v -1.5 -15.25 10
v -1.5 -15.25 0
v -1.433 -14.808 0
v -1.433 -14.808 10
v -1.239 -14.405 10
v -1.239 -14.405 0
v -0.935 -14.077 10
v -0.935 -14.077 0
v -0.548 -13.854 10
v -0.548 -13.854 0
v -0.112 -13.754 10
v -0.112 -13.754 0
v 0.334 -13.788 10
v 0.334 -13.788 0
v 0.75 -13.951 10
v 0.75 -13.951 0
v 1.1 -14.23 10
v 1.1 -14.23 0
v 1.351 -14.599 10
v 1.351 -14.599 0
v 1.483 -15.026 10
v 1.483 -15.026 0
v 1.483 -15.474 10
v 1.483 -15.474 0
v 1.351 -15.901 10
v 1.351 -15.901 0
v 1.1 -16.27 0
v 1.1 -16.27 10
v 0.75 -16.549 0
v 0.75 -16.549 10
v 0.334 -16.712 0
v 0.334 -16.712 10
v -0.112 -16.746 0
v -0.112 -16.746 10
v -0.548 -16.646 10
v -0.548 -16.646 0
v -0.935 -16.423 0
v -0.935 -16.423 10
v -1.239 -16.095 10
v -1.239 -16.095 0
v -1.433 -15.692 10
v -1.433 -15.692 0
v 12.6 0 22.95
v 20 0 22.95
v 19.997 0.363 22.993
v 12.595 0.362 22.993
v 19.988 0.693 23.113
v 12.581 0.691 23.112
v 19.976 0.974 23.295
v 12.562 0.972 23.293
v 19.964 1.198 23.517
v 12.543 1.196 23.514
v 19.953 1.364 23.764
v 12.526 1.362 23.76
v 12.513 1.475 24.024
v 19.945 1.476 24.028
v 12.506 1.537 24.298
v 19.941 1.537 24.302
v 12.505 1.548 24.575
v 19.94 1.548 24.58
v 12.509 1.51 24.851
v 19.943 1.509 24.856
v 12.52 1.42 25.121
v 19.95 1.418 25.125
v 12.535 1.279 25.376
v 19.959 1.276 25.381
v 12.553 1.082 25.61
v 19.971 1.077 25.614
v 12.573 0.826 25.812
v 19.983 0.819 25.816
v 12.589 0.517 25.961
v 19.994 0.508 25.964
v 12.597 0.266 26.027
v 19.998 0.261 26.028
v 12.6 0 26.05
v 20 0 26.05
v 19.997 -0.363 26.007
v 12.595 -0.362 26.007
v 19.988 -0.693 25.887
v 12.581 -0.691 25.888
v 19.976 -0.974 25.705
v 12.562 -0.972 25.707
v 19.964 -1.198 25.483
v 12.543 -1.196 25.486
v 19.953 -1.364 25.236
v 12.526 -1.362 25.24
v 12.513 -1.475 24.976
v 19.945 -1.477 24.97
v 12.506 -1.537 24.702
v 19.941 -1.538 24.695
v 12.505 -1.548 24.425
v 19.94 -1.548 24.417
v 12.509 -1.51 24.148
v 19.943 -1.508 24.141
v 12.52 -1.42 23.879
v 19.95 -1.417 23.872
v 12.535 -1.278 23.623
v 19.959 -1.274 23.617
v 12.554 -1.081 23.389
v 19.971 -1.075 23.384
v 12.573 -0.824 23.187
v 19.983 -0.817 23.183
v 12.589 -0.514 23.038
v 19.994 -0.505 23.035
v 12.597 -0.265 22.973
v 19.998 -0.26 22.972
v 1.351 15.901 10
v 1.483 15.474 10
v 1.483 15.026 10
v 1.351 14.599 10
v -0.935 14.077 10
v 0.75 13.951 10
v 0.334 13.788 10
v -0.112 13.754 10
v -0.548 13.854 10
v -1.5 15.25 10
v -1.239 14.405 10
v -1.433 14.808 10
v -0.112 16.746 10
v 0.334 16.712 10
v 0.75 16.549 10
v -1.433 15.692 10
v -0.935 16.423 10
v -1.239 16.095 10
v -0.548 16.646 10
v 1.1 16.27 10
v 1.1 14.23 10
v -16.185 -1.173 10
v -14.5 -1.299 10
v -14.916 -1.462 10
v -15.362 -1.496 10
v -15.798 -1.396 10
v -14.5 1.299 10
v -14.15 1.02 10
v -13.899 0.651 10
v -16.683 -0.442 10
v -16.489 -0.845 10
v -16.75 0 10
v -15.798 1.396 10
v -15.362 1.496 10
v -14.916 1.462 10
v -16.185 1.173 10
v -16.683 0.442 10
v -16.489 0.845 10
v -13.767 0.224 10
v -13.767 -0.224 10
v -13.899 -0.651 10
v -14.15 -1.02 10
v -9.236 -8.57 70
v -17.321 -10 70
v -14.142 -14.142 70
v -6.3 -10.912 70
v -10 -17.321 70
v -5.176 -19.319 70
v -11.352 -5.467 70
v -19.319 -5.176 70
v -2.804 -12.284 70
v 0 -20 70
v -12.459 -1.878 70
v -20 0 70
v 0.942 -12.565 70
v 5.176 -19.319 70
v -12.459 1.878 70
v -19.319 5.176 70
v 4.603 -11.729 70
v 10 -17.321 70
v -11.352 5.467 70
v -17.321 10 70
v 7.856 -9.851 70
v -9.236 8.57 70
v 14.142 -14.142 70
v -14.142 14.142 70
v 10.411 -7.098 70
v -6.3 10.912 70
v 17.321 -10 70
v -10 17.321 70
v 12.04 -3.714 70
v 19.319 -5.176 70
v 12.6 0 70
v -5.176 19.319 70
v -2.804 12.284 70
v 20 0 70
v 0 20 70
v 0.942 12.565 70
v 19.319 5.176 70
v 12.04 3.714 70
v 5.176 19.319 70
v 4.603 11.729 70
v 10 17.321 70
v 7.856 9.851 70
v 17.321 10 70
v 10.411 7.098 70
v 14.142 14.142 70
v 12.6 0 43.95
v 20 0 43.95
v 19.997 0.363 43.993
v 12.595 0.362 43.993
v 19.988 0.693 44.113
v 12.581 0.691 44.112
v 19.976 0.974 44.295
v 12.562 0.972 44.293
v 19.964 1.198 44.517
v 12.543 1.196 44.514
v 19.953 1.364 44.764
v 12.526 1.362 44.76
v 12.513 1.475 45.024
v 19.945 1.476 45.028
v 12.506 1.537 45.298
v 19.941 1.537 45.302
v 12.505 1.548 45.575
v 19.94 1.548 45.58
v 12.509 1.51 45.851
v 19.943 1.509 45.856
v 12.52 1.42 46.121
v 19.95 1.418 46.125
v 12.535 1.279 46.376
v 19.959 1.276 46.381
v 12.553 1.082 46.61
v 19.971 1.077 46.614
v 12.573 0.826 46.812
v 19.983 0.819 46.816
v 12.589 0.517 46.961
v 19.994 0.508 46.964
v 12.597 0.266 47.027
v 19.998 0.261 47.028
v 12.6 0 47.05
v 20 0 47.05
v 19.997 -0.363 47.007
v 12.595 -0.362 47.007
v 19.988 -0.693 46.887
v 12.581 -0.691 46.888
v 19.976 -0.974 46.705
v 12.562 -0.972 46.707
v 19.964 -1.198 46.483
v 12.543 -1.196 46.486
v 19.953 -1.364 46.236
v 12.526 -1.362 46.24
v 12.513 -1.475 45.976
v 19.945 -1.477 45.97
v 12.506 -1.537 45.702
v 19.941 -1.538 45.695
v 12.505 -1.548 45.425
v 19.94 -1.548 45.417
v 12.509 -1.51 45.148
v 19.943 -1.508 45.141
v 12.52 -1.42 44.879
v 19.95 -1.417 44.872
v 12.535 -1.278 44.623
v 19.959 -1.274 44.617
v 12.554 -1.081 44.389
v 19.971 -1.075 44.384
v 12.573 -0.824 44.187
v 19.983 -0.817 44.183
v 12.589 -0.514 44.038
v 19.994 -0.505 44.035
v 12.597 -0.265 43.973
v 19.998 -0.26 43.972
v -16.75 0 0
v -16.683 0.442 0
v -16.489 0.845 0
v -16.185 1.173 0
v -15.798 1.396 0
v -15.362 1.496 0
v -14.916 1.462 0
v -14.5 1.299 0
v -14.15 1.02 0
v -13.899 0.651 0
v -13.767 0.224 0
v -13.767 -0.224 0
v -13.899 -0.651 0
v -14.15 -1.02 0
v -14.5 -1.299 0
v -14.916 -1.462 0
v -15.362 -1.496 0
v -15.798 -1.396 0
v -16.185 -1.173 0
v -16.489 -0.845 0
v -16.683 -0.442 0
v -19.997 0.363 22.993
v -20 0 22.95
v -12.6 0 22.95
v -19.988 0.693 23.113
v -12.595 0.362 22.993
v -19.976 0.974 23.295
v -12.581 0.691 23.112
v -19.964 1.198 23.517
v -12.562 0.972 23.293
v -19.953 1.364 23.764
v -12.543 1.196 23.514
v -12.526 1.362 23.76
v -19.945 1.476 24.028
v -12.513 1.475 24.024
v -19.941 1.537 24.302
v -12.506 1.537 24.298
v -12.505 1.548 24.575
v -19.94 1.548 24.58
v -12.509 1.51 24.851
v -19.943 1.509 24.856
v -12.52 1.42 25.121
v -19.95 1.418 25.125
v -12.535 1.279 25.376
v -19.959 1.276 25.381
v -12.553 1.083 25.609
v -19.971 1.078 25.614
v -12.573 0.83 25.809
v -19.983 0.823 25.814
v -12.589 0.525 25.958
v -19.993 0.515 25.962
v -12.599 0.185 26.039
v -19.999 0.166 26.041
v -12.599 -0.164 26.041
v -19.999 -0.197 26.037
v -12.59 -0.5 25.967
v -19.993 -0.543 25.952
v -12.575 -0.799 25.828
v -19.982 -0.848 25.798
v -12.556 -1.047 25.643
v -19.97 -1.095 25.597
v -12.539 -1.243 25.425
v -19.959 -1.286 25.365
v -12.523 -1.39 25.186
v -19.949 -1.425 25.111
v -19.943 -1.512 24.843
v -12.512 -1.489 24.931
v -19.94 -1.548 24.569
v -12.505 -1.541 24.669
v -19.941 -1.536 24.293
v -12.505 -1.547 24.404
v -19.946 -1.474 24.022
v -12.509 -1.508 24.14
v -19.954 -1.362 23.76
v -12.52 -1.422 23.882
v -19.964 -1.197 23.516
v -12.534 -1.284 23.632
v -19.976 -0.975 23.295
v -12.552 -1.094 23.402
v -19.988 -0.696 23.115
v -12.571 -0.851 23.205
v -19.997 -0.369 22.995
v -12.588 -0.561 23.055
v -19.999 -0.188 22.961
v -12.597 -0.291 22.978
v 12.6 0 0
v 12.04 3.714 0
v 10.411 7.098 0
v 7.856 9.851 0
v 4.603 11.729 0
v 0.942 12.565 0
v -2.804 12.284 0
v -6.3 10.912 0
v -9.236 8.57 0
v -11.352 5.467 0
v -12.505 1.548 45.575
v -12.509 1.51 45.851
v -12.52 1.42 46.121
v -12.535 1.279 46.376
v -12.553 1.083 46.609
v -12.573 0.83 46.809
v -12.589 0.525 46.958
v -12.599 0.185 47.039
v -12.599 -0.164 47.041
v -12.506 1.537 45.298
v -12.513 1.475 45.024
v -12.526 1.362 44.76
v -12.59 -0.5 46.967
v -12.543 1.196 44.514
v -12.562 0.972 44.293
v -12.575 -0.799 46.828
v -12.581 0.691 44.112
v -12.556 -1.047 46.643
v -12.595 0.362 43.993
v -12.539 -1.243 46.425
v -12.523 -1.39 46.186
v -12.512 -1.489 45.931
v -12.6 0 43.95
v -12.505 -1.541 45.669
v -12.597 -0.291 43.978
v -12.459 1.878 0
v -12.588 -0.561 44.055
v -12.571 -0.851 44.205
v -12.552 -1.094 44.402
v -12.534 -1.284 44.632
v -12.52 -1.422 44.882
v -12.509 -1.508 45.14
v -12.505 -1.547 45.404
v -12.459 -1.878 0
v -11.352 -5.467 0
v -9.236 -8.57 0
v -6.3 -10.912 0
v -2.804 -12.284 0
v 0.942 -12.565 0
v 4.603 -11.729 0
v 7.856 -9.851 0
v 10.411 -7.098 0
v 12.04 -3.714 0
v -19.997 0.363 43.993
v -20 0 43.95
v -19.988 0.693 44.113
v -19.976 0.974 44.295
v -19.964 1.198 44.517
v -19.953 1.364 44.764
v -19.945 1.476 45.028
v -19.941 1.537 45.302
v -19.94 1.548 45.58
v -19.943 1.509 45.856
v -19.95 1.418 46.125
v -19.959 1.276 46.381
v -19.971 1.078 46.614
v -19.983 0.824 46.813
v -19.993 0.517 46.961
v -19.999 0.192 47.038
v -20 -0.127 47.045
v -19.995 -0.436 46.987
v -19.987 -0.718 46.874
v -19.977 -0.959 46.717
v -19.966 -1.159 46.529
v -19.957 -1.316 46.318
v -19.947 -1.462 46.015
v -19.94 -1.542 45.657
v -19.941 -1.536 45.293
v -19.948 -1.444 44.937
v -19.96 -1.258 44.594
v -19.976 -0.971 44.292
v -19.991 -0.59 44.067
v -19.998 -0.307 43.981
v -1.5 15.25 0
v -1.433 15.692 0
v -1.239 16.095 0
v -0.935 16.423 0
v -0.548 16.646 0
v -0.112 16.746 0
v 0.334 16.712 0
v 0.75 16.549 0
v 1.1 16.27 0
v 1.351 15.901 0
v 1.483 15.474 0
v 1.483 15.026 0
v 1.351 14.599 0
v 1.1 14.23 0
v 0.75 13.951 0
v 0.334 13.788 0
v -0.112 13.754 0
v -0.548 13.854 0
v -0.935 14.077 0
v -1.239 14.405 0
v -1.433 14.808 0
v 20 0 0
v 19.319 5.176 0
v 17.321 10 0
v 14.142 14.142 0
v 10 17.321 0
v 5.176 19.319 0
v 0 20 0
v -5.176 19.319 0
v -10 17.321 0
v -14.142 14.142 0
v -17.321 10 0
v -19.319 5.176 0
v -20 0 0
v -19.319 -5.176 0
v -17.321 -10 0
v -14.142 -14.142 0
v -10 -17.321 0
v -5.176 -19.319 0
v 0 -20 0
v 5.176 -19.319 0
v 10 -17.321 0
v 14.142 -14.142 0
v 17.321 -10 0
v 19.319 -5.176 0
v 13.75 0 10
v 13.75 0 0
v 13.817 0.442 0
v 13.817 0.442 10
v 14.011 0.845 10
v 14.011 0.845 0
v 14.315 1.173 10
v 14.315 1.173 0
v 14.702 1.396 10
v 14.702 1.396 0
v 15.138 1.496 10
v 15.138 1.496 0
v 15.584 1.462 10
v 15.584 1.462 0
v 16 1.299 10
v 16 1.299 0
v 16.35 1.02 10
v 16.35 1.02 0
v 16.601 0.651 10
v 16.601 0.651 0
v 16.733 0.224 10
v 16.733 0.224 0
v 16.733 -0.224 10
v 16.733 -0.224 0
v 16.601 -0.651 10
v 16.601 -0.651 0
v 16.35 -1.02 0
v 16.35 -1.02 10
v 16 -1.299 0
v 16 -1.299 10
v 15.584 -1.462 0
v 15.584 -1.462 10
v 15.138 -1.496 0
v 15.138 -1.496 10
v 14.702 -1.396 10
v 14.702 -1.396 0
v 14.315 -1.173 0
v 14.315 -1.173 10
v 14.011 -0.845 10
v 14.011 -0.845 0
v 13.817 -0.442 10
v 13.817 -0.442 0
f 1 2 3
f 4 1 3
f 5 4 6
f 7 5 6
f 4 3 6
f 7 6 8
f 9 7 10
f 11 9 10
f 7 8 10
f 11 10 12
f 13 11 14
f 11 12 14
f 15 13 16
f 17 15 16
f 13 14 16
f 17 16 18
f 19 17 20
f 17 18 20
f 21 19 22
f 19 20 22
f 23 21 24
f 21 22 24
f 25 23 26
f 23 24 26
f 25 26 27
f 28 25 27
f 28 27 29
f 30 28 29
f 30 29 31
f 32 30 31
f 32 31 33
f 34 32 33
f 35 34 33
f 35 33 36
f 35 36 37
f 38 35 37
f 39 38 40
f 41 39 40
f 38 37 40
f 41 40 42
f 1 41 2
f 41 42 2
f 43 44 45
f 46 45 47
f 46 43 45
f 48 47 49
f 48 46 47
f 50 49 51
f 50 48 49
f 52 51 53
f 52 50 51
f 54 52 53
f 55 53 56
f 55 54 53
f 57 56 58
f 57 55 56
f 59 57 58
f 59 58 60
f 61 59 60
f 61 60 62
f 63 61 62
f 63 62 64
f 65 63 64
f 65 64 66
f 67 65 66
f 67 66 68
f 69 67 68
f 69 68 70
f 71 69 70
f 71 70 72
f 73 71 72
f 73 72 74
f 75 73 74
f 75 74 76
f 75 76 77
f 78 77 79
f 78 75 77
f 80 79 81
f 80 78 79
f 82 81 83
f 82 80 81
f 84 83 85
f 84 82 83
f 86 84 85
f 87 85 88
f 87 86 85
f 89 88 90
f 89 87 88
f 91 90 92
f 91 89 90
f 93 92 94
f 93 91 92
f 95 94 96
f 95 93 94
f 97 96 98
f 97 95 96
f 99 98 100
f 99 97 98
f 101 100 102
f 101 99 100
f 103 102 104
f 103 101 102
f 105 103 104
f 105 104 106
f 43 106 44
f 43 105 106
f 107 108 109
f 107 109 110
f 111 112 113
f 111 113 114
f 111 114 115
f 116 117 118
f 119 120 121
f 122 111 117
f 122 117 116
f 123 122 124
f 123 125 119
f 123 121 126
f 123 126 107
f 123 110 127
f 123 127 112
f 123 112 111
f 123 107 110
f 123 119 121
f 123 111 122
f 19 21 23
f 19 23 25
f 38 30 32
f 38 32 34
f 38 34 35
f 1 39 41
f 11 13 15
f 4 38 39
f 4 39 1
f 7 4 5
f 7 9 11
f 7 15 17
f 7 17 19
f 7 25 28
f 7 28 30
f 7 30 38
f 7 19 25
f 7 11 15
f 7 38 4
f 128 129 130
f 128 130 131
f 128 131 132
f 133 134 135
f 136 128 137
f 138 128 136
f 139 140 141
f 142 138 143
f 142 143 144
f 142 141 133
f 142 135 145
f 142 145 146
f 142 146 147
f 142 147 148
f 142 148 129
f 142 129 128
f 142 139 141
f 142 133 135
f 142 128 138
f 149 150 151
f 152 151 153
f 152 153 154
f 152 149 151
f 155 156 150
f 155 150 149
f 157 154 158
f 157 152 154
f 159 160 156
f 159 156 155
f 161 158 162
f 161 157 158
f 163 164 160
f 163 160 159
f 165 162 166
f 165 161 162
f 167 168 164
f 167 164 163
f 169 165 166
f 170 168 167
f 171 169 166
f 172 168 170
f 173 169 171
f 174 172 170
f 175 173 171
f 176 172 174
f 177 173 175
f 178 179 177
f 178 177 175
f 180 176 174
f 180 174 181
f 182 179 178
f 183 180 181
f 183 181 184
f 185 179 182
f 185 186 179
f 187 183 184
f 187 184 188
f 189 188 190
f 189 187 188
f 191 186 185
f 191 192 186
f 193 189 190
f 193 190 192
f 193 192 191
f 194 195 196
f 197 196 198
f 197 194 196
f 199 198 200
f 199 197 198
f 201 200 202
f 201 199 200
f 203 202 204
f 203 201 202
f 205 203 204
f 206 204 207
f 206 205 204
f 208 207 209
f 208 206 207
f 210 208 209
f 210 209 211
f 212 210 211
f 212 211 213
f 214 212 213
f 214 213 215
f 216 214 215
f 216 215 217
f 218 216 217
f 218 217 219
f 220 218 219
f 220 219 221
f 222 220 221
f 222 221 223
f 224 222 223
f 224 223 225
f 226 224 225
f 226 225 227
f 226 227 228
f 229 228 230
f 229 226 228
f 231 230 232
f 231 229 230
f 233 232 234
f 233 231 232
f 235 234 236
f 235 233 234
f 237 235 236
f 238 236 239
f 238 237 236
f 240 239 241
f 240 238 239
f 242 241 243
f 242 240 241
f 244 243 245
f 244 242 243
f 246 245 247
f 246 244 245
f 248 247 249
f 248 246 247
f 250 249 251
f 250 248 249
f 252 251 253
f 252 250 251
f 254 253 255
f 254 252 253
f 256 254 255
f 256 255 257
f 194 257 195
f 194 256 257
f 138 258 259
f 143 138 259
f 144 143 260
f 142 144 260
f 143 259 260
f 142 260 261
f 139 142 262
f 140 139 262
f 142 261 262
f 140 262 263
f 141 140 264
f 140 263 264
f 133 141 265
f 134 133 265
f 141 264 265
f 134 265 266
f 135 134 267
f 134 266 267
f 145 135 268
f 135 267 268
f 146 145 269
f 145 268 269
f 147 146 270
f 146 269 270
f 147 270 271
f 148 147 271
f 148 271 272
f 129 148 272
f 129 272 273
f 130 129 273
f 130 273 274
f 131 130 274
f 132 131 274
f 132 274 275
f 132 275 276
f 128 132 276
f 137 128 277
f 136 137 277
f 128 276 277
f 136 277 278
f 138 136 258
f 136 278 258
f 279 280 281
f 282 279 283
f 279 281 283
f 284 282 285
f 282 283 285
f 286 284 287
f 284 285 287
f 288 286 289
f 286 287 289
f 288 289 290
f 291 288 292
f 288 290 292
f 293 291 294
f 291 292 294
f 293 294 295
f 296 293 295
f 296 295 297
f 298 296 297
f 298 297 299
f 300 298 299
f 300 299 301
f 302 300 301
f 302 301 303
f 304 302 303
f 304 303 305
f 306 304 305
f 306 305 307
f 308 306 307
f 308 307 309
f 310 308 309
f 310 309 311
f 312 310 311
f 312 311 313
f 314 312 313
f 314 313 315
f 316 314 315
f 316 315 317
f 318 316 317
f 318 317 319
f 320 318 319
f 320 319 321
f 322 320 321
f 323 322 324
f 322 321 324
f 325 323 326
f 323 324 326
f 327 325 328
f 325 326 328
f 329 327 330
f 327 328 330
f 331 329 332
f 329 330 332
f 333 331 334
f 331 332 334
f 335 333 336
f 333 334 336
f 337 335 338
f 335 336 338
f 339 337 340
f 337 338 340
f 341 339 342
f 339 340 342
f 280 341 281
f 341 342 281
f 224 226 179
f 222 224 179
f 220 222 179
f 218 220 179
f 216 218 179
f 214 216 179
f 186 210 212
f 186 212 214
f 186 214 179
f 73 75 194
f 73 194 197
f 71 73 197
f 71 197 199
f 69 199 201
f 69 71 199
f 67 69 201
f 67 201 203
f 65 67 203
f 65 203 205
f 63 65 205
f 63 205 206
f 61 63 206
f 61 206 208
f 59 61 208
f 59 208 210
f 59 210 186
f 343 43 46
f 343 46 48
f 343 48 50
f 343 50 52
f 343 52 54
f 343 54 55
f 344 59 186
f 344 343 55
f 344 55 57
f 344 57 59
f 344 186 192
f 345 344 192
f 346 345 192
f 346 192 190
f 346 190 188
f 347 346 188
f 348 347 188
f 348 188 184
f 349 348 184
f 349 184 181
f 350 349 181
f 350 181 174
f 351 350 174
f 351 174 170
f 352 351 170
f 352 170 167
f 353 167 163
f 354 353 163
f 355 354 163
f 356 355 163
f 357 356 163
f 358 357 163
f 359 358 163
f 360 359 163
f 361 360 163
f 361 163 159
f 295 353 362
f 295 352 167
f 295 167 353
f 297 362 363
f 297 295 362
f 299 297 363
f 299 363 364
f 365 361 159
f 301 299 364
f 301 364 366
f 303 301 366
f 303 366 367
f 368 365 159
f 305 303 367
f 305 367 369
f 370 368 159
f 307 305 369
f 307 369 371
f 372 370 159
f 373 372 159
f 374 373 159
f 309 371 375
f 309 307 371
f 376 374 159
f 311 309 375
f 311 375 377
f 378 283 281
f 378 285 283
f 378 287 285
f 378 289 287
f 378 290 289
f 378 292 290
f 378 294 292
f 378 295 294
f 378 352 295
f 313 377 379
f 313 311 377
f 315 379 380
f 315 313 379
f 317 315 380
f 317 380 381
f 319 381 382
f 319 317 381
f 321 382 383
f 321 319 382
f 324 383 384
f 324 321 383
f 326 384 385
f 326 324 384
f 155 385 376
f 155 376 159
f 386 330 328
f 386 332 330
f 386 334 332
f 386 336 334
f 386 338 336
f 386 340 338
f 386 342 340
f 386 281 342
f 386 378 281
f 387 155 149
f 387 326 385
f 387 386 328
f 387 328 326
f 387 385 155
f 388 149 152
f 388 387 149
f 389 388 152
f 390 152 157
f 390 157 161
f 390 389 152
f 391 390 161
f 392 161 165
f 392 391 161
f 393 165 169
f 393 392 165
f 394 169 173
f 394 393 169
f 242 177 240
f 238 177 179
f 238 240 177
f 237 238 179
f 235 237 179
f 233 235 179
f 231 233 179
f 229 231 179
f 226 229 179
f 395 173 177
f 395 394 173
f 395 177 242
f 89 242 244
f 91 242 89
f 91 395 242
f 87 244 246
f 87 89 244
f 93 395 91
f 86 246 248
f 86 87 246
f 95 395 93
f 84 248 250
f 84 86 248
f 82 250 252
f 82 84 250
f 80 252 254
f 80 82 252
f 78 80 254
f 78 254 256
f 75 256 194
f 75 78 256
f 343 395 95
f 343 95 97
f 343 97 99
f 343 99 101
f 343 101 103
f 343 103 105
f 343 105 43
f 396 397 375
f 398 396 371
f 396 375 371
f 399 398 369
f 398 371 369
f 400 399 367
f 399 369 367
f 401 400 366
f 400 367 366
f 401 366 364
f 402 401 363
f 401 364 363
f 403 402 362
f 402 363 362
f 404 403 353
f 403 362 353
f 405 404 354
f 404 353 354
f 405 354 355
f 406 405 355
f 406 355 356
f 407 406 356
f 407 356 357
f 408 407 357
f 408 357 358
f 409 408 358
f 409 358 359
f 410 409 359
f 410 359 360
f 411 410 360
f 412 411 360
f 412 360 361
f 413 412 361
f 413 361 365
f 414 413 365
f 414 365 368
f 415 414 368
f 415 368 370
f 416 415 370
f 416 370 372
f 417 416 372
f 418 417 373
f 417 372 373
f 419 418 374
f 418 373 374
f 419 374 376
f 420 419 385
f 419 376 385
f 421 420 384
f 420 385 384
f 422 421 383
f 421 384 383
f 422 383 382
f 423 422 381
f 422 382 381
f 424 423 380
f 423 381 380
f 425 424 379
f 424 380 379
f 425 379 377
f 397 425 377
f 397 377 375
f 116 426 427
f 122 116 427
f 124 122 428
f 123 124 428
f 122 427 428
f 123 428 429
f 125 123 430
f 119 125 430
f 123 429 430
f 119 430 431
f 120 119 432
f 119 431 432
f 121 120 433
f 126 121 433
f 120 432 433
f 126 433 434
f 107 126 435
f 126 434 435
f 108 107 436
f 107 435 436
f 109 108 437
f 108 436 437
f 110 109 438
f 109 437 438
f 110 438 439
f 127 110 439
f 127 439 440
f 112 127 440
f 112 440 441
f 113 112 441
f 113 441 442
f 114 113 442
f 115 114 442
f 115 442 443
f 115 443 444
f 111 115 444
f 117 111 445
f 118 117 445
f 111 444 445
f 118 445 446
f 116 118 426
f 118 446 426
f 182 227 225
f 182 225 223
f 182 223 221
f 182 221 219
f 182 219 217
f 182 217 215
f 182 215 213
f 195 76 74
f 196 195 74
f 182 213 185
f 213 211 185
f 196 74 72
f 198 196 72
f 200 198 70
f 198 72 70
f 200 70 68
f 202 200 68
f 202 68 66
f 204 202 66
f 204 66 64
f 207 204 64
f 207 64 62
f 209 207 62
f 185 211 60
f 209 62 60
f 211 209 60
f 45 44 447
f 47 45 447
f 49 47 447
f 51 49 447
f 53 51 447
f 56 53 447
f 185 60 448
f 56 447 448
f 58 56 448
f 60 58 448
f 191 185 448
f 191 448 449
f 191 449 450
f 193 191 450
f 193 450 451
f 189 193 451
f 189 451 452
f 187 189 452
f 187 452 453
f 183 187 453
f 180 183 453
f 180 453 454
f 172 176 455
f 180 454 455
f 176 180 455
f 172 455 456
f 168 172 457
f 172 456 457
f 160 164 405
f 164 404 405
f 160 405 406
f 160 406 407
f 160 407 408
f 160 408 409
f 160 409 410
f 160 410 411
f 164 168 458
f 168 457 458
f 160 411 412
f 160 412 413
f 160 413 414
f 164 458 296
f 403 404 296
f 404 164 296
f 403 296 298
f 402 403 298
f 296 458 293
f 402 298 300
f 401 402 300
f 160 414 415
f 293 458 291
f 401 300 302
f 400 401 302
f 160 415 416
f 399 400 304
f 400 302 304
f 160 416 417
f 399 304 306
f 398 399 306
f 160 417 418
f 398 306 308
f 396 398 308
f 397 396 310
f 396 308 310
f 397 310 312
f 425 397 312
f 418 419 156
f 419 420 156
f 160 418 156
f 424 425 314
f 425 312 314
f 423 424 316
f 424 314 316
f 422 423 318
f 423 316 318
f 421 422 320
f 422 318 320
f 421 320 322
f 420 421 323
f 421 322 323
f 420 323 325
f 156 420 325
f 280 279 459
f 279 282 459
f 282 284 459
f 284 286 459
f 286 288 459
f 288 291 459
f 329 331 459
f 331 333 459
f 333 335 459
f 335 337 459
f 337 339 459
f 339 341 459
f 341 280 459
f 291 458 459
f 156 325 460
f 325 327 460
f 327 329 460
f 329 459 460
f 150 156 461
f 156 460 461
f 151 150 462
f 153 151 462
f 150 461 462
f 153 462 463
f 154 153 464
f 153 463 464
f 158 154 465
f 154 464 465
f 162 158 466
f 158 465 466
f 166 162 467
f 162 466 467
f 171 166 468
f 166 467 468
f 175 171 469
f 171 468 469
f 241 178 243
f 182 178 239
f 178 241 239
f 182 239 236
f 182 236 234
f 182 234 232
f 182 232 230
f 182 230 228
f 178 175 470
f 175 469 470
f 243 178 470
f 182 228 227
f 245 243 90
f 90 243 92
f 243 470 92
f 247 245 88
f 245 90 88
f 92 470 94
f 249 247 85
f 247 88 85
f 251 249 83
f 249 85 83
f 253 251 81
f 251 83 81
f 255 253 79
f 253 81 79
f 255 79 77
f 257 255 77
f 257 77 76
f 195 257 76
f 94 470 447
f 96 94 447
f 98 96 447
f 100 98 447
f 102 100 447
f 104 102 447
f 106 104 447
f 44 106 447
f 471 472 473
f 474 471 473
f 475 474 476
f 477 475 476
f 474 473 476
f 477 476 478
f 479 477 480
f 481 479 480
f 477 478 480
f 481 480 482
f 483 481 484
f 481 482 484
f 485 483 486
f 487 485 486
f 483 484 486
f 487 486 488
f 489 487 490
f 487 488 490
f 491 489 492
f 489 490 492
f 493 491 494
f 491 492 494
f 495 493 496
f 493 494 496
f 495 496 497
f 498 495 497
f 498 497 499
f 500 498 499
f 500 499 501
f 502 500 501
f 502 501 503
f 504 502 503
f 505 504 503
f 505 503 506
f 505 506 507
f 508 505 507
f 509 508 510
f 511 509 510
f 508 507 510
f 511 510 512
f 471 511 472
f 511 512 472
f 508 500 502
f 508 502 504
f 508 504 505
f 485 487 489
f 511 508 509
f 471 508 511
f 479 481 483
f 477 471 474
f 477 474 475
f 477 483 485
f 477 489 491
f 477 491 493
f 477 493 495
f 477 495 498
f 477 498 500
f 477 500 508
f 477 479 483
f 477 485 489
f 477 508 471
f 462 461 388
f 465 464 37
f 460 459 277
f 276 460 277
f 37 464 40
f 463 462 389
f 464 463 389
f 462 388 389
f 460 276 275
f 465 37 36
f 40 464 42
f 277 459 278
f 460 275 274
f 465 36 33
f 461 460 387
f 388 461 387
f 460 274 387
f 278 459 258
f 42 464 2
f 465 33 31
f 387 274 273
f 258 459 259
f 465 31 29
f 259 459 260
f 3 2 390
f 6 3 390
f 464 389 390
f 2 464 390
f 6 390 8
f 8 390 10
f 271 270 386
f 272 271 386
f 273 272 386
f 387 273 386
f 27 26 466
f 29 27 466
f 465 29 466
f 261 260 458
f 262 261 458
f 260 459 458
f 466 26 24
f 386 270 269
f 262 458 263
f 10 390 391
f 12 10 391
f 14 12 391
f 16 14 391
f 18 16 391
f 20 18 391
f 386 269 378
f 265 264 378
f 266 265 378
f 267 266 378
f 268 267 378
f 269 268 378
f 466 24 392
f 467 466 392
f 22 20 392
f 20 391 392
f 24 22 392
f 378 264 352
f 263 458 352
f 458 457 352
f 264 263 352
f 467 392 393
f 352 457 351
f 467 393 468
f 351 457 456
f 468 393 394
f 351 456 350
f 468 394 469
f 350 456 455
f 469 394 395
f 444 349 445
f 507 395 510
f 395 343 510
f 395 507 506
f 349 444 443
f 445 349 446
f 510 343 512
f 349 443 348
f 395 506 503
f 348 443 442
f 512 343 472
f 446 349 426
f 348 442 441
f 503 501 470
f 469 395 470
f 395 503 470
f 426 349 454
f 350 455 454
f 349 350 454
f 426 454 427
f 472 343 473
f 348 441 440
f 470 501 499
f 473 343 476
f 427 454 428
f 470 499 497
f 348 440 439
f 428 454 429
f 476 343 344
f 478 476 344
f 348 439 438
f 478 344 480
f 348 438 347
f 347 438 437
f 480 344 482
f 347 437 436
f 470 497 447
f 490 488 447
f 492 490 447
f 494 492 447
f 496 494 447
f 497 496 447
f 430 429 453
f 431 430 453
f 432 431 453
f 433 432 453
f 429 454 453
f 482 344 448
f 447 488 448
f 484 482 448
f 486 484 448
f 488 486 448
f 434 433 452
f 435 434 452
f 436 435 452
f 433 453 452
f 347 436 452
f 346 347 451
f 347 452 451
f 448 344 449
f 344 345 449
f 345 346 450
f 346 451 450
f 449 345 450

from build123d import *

# Parameters (mm, degrees)
SKETCH1_R               = 20
SKETCH1_R_2             = 12.6
BOSS_EXTRUDE1_DEPTH     = 70
SKETCH2_R               = 1.5
CUT_EXTRUDE1_DEPTH      = 10
SKETCH3_R               = 1.55
CUT_EXTRUDE2_DEPTH      = 21
CUT_EXTRUDE2_DEPTH_BACK = 21


with BuildPart() as part:
    # Sketch1 → Boss-Extrude1 (new body)
    with BuildSketch(Plane.XY):
        Circle(SKETCH1_R)
        Circle(SKETCH1_R_2, mode=Mode.SUBTRACT)
    extrude(amount=BOSS_EXTRUDE1_DEPTH)

    # Sketch2 → Cut-Extrude1 (cut)
    with BuildSketch(Plane(origin=(0, 0, 0), x_dir=(-1, 0, 0), z_dir=(0, 0, -1))):
        with Locations((0, 15.25)):
            Circle(SKETCH2_R)
        with Locations((15.25, 0)):
            Circle(SKETCH2_R)
        with Locations((0, -15.25)):
            Circle(SKETCH2_R)
        with Locations((-15.25, 0)):
            Circle(SKETCH2_R)
    extrude(amount=-CUT_EXTRUDE1_DEPTH, mode=Mode.SUBTRACT)

    # Sketch3 → Cut-Extrude2 (cut, two sides)
    with BuildSketch(Plane(origin=(0, 0, 0), x_dir=(0, 0, -1), z_dir=(1, 0, 0))) as cut_extrude2_sk:
        with Locations((-45.5, 0)):
            Circle(SKETCH3_R)
        with Locations((-24.5, 0)):
            Circle(SKETCH3_R)
    extrude(amount=CUT_EXTRUDE2_DEPTH, mode=Mode.SUBTRACT)
    extrude(cut_extrude2_sk.sketch, amount=-CUT_EXTRUDE2_DEPTH_BACK, mode=Mode.SUBTRACT)


solid = part.part
